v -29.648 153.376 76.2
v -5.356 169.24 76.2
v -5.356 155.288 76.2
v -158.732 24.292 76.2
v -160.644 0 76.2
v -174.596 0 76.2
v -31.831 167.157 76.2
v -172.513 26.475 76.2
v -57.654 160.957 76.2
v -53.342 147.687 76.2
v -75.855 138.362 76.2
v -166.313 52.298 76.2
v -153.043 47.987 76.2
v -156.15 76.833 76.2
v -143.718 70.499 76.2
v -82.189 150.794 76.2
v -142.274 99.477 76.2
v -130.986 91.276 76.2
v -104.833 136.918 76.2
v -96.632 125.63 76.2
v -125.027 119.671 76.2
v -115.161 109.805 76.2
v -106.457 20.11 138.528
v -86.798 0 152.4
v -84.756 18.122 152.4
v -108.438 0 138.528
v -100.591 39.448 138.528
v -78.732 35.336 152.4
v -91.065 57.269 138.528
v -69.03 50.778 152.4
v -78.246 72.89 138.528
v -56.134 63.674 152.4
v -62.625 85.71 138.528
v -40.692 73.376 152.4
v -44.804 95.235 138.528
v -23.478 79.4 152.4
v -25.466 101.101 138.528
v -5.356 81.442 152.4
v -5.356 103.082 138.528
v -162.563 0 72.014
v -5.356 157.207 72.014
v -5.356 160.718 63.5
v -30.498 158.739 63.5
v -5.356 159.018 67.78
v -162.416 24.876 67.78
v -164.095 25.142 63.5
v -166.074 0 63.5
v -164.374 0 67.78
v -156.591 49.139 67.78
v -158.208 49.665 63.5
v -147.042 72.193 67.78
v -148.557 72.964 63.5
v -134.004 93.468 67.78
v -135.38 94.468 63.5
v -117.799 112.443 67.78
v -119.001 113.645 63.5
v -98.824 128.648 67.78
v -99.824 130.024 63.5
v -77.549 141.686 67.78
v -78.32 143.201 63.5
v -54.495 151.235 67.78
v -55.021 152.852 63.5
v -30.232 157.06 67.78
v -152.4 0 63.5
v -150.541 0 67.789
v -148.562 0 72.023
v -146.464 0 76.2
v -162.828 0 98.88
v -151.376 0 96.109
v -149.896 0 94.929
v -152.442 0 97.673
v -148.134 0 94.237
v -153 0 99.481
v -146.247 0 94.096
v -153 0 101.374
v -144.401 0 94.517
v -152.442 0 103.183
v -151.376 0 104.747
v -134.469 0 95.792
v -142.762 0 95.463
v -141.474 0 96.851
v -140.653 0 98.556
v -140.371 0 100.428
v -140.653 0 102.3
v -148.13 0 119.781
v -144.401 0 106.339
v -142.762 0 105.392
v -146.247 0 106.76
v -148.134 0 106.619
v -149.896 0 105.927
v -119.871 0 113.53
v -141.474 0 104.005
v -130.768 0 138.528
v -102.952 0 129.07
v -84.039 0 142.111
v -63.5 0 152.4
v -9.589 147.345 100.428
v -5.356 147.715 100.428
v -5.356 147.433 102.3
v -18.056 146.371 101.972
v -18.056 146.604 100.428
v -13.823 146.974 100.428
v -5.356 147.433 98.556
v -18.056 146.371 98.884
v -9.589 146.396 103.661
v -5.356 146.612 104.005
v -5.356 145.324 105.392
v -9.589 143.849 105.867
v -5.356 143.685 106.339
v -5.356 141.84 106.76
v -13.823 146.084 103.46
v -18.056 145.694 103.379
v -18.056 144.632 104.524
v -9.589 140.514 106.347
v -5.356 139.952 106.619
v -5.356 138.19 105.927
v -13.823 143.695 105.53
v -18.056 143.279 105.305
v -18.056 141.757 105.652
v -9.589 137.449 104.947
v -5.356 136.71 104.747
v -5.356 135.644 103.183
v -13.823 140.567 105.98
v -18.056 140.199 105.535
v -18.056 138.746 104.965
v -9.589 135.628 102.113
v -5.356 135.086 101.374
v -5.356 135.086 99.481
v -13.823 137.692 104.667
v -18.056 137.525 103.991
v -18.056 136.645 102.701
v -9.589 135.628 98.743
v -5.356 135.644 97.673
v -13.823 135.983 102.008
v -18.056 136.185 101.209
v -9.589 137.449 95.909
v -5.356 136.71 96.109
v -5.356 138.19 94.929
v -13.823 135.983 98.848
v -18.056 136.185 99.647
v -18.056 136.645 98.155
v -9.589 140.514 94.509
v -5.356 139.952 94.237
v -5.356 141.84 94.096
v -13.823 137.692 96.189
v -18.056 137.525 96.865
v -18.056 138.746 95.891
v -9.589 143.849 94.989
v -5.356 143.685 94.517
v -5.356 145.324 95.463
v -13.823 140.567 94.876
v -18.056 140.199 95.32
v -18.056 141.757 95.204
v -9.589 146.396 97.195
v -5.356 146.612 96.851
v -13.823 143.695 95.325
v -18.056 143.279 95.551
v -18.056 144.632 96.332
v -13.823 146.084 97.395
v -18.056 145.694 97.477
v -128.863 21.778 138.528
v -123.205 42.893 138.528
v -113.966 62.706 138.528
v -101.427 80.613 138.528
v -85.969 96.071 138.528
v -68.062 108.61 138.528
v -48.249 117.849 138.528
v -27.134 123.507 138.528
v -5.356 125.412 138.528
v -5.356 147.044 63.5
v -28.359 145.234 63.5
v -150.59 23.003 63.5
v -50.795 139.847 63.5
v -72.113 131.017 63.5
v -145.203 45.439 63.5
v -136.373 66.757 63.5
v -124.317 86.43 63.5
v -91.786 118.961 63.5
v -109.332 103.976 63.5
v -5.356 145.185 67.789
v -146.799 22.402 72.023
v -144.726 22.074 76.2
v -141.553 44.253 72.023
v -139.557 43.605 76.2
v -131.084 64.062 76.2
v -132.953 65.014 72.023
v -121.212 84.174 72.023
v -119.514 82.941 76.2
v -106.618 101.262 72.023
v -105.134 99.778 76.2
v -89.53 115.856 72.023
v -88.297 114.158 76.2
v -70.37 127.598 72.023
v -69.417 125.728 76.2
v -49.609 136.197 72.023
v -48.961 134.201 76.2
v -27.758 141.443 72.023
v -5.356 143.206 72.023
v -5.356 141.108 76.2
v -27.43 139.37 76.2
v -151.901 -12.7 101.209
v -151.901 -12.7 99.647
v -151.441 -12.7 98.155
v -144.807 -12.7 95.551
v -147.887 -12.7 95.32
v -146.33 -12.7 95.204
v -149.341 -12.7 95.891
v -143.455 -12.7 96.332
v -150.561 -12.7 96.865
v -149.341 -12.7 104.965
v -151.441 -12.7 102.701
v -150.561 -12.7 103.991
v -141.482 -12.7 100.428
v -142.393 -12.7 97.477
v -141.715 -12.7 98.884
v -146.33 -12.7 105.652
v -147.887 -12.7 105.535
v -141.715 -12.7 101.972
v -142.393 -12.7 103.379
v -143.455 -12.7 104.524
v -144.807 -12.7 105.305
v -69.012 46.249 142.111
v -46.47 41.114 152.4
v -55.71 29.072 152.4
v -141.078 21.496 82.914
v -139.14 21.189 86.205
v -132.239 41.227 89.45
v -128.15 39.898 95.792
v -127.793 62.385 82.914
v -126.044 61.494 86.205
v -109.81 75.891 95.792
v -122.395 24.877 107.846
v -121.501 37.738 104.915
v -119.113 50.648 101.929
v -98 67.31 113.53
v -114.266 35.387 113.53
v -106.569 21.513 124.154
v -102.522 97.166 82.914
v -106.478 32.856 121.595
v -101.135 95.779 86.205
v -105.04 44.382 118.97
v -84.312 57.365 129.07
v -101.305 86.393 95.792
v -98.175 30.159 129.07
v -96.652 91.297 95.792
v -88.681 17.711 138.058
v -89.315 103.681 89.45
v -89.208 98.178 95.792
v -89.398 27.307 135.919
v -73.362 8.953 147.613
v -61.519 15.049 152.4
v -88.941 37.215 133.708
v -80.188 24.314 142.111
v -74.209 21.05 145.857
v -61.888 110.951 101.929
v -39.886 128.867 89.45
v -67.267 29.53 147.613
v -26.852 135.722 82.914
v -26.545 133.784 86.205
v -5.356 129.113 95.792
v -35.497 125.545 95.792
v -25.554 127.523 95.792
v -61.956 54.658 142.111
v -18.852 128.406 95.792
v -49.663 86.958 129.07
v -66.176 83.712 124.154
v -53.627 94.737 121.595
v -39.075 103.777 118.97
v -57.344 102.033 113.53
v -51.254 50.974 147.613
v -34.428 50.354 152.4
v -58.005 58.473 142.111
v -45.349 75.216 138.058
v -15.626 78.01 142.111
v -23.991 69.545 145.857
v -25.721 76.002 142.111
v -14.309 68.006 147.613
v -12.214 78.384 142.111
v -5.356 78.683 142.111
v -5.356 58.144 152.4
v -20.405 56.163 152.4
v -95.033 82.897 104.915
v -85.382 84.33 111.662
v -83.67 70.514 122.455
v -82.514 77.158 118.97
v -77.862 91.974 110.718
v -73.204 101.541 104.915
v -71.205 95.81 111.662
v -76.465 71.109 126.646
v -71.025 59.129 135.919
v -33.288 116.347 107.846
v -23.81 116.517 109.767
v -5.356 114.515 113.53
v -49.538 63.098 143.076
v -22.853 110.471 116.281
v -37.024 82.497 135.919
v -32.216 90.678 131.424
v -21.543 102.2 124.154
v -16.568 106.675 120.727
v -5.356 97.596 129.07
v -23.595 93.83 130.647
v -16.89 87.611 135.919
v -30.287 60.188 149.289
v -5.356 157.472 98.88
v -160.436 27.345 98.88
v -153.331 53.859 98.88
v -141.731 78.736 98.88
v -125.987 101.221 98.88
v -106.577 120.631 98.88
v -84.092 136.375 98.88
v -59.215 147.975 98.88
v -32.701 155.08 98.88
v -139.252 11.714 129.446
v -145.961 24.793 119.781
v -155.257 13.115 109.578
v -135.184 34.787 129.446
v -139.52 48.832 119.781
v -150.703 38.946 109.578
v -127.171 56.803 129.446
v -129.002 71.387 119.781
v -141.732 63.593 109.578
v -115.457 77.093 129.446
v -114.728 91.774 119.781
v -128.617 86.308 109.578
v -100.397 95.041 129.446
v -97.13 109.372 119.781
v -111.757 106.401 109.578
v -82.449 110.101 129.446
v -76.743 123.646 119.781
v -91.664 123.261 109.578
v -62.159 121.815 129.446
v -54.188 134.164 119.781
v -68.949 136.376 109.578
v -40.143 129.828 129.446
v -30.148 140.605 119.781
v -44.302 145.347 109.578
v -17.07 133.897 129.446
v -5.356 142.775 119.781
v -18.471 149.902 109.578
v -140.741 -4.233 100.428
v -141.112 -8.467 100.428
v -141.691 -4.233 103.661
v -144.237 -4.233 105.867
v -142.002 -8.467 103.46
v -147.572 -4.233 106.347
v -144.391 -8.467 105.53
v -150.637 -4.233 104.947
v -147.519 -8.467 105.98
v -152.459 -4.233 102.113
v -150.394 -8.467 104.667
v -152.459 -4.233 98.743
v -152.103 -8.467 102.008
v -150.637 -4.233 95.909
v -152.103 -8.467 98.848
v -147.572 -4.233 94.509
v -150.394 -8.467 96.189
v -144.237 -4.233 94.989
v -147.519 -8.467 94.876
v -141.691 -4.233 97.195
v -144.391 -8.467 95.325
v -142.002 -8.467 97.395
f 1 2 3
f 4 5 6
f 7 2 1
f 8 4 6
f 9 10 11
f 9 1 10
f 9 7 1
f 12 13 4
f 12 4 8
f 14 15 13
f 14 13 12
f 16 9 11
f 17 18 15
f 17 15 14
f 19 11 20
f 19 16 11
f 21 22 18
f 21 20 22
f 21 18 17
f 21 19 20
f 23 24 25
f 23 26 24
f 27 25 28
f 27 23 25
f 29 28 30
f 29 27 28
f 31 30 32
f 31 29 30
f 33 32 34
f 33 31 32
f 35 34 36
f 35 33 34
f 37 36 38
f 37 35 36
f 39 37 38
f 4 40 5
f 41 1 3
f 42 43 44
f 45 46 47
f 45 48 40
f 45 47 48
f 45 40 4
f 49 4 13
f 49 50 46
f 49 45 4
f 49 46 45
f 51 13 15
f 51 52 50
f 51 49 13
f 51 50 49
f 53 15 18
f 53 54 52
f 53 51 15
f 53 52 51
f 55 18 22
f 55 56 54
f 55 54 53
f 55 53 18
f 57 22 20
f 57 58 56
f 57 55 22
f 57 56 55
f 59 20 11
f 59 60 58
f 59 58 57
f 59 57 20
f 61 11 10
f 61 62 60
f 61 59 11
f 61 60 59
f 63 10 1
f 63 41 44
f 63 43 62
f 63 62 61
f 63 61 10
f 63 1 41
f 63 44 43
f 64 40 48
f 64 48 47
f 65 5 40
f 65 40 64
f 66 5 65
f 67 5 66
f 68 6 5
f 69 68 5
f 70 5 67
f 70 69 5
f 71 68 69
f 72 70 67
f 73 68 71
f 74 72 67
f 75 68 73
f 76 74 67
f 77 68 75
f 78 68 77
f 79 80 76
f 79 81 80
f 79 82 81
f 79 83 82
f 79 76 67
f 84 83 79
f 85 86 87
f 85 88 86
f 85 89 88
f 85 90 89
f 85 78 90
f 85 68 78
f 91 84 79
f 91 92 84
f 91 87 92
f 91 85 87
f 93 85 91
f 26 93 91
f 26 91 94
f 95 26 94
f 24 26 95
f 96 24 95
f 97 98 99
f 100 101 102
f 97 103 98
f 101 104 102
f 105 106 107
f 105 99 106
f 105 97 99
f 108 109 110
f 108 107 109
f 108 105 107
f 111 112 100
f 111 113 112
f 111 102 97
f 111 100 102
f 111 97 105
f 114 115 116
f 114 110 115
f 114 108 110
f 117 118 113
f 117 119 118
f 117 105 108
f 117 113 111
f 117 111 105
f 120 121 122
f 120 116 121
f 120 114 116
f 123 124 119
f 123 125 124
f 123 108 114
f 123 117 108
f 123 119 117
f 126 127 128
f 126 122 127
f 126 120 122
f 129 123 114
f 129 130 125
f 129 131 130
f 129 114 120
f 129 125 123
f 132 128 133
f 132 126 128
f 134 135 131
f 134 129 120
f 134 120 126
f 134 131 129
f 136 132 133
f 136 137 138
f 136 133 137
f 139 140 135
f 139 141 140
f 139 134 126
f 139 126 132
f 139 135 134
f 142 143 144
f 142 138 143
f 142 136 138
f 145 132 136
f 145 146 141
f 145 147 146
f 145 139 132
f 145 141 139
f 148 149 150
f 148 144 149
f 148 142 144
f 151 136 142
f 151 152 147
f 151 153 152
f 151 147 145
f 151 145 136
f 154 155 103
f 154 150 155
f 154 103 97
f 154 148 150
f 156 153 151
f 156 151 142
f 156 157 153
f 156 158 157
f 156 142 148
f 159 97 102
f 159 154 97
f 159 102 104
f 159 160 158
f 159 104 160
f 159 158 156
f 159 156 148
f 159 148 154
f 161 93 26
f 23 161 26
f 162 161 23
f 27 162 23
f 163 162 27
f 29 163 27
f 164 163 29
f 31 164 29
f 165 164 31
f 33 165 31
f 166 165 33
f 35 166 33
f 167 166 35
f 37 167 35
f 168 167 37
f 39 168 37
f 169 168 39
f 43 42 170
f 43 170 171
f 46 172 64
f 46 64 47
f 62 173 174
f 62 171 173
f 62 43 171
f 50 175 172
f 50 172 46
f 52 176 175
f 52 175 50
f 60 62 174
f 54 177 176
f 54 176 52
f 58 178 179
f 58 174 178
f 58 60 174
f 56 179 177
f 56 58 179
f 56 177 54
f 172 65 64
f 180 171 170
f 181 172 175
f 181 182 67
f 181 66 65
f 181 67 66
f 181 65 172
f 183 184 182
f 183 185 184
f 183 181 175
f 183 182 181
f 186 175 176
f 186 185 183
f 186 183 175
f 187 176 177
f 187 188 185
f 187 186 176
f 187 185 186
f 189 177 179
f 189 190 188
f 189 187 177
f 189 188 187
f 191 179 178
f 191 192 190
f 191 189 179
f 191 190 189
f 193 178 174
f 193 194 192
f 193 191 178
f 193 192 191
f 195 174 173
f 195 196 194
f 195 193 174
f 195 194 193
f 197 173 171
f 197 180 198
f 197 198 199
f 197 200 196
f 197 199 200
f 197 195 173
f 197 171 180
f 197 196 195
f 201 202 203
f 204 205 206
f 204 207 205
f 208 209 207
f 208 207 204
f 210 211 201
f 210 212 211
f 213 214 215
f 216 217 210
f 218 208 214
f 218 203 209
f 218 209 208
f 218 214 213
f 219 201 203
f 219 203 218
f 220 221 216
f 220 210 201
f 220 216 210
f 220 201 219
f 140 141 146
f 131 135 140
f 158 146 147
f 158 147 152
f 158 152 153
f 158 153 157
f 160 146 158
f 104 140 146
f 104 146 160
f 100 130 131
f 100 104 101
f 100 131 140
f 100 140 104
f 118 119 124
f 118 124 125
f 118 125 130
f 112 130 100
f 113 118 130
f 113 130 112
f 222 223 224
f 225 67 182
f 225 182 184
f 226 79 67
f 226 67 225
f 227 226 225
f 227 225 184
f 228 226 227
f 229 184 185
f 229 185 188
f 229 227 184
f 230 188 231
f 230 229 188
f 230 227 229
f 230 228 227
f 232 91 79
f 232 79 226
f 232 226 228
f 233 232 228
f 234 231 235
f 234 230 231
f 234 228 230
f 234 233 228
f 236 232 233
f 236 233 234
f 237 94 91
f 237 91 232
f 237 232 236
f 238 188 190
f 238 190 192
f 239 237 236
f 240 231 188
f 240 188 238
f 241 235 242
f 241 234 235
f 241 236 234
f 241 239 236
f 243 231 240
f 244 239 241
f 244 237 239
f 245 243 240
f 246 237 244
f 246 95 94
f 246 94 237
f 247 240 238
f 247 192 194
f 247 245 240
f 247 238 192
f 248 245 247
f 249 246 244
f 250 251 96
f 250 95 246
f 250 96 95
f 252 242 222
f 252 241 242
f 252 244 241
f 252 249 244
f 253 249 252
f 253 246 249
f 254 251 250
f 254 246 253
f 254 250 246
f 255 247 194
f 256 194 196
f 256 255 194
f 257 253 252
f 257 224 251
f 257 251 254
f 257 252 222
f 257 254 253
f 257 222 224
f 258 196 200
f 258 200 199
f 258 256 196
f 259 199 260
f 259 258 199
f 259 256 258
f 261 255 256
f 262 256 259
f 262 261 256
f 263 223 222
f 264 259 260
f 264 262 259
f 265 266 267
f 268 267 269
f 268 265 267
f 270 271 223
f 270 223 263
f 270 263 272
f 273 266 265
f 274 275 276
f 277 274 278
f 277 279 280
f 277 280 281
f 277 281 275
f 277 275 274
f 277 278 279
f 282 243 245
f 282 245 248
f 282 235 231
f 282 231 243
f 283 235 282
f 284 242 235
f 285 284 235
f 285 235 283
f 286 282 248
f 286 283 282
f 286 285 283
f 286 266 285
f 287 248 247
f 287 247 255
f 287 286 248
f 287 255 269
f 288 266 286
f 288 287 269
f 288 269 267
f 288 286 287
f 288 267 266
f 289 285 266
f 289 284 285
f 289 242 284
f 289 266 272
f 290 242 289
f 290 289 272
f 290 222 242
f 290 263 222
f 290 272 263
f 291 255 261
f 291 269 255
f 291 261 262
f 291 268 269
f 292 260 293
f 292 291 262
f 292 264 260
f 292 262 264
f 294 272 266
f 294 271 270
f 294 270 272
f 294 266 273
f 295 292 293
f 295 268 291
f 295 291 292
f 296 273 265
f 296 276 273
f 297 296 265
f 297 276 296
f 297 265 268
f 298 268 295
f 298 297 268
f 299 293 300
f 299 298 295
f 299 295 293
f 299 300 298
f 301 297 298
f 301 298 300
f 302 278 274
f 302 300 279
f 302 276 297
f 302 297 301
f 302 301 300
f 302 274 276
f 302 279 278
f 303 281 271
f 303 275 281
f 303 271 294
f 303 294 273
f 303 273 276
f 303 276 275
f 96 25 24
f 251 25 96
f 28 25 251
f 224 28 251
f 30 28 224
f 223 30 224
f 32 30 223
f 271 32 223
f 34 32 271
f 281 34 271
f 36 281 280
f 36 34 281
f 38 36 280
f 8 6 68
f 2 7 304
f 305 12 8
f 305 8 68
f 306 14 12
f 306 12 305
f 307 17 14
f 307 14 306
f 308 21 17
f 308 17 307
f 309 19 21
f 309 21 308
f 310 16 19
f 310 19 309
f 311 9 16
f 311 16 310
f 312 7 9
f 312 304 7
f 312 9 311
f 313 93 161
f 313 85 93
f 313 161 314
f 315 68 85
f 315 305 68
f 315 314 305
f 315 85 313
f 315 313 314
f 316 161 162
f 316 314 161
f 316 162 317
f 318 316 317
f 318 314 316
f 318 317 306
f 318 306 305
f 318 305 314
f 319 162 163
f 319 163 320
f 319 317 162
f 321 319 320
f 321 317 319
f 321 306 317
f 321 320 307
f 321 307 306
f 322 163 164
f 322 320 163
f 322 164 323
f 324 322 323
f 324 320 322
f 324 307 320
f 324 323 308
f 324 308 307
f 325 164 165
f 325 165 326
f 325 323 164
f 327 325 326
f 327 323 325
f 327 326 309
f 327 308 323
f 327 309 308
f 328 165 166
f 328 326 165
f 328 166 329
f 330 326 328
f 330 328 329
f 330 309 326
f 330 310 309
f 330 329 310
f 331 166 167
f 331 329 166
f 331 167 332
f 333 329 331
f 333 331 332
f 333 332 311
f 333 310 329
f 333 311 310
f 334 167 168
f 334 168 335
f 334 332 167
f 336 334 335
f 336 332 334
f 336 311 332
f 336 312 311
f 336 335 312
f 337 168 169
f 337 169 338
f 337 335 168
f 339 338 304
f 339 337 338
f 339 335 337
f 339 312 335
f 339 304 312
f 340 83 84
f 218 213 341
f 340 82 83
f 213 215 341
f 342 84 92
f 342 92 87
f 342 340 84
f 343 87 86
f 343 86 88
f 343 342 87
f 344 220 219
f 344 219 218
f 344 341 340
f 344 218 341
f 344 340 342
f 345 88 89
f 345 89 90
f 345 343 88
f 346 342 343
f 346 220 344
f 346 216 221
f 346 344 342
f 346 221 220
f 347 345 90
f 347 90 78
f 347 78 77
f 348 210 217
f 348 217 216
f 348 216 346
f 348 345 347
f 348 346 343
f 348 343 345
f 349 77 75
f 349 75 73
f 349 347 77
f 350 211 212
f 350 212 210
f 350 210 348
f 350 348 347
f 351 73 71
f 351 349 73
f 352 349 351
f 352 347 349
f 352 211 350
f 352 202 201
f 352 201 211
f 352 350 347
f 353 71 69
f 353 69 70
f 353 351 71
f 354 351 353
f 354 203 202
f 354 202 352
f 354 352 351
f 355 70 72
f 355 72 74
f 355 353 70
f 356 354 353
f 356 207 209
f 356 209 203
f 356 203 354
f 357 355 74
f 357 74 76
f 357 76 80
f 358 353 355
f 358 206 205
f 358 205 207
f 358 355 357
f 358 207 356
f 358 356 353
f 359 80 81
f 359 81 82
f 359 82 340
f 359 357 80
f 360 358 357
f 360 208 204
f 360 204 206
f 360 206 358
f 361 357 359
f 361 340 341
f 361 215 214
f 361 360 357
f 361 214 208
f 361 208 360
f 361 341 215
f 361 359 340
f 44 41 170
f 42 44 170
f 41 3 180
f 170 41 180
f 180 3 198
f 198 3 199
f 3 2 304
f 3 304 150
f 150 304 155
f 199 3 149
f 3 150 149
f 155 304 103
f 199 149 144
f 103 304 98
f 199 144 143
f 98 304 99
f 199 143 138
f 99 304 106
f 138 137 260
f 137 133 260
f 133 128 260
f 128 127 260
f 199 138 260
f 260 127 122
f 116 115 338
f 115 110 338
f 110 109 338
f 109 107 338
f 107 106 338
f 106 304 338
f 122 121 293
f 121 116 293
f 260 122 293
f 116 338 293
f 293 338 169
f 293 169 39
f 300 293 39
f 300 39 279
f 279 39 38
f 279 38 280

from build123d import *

# Parameters (mm, degrees)
F1_ANGLE = 90
F2_R     = 6.35
F3_DEPTH = 12.7
F3_TAPER = 5
F4_R     = 6.35
F5_DEPTH = 12.7
F5_TAPER = 5


with BuildPart() as f1:
    # F0 (on Front) → F1 (revolve)
    with BuildSketch(Plane.XZ):
        with BuildLine():
            Line((-108.4379373307, 138.5278597593), (-130.7680468253, 138.5278597593))
            ThreePointArc((-130.7680468253, 138.5278597593), (-155.8300717286, 109.5775467195), (-174.5961339778, 76.2))
            Line((-174.5961339778, 76.2), (-160.6437051366, 76.2))
            ThreePointArc((-160.6437051366, 76.2), (-163.4822477804, 69.9027514527), (-166.0740497489, 63.5))
            Line((-166.0740497489, 63.5), (-152.4, 63.5))
            ThreePointArc((-152.4, 63.5), (-149.5666310557, 69.9130379445), (-146.4635449523, 76.2))
            ThreePointArc((-146.4635449523, 76.2), (-111.6816124178, 121.5945206322), (-63.5, 152.4))
            Line((-63.5, 152.4), (-86.7975307453, 152.4))
            Line((-86.7975307453, 152.4), (-108.4379373307, 138.5278597593))
        make_face()
    revolve(axis=Axis((-5.3559339778, 0, 114.3), (0, 0, -1)), revolution_arc=F1_ANGLE)

    # F2 (on face) → F3 (join)
    with BuildSketch(Plane.XZ):
        with Locations((-146.7211129462, 100.4278597593)):
            Circle(F2_R)
    extrude(amount=F3_DEPTH, taper=F3_TAPER)

    # F4 (on face) → F5 (cut)
    with BuildSketch(Plane.YZ.offset(-5.3559339778)):
        with Locations((141.3651789683, 100.4278597593)):
            Circle(F4_R)
    extrude(amount=-F5_DEPTH, taper=F5_TAPER, mode=Mode.SUBTRACT)


solid = f1.part
